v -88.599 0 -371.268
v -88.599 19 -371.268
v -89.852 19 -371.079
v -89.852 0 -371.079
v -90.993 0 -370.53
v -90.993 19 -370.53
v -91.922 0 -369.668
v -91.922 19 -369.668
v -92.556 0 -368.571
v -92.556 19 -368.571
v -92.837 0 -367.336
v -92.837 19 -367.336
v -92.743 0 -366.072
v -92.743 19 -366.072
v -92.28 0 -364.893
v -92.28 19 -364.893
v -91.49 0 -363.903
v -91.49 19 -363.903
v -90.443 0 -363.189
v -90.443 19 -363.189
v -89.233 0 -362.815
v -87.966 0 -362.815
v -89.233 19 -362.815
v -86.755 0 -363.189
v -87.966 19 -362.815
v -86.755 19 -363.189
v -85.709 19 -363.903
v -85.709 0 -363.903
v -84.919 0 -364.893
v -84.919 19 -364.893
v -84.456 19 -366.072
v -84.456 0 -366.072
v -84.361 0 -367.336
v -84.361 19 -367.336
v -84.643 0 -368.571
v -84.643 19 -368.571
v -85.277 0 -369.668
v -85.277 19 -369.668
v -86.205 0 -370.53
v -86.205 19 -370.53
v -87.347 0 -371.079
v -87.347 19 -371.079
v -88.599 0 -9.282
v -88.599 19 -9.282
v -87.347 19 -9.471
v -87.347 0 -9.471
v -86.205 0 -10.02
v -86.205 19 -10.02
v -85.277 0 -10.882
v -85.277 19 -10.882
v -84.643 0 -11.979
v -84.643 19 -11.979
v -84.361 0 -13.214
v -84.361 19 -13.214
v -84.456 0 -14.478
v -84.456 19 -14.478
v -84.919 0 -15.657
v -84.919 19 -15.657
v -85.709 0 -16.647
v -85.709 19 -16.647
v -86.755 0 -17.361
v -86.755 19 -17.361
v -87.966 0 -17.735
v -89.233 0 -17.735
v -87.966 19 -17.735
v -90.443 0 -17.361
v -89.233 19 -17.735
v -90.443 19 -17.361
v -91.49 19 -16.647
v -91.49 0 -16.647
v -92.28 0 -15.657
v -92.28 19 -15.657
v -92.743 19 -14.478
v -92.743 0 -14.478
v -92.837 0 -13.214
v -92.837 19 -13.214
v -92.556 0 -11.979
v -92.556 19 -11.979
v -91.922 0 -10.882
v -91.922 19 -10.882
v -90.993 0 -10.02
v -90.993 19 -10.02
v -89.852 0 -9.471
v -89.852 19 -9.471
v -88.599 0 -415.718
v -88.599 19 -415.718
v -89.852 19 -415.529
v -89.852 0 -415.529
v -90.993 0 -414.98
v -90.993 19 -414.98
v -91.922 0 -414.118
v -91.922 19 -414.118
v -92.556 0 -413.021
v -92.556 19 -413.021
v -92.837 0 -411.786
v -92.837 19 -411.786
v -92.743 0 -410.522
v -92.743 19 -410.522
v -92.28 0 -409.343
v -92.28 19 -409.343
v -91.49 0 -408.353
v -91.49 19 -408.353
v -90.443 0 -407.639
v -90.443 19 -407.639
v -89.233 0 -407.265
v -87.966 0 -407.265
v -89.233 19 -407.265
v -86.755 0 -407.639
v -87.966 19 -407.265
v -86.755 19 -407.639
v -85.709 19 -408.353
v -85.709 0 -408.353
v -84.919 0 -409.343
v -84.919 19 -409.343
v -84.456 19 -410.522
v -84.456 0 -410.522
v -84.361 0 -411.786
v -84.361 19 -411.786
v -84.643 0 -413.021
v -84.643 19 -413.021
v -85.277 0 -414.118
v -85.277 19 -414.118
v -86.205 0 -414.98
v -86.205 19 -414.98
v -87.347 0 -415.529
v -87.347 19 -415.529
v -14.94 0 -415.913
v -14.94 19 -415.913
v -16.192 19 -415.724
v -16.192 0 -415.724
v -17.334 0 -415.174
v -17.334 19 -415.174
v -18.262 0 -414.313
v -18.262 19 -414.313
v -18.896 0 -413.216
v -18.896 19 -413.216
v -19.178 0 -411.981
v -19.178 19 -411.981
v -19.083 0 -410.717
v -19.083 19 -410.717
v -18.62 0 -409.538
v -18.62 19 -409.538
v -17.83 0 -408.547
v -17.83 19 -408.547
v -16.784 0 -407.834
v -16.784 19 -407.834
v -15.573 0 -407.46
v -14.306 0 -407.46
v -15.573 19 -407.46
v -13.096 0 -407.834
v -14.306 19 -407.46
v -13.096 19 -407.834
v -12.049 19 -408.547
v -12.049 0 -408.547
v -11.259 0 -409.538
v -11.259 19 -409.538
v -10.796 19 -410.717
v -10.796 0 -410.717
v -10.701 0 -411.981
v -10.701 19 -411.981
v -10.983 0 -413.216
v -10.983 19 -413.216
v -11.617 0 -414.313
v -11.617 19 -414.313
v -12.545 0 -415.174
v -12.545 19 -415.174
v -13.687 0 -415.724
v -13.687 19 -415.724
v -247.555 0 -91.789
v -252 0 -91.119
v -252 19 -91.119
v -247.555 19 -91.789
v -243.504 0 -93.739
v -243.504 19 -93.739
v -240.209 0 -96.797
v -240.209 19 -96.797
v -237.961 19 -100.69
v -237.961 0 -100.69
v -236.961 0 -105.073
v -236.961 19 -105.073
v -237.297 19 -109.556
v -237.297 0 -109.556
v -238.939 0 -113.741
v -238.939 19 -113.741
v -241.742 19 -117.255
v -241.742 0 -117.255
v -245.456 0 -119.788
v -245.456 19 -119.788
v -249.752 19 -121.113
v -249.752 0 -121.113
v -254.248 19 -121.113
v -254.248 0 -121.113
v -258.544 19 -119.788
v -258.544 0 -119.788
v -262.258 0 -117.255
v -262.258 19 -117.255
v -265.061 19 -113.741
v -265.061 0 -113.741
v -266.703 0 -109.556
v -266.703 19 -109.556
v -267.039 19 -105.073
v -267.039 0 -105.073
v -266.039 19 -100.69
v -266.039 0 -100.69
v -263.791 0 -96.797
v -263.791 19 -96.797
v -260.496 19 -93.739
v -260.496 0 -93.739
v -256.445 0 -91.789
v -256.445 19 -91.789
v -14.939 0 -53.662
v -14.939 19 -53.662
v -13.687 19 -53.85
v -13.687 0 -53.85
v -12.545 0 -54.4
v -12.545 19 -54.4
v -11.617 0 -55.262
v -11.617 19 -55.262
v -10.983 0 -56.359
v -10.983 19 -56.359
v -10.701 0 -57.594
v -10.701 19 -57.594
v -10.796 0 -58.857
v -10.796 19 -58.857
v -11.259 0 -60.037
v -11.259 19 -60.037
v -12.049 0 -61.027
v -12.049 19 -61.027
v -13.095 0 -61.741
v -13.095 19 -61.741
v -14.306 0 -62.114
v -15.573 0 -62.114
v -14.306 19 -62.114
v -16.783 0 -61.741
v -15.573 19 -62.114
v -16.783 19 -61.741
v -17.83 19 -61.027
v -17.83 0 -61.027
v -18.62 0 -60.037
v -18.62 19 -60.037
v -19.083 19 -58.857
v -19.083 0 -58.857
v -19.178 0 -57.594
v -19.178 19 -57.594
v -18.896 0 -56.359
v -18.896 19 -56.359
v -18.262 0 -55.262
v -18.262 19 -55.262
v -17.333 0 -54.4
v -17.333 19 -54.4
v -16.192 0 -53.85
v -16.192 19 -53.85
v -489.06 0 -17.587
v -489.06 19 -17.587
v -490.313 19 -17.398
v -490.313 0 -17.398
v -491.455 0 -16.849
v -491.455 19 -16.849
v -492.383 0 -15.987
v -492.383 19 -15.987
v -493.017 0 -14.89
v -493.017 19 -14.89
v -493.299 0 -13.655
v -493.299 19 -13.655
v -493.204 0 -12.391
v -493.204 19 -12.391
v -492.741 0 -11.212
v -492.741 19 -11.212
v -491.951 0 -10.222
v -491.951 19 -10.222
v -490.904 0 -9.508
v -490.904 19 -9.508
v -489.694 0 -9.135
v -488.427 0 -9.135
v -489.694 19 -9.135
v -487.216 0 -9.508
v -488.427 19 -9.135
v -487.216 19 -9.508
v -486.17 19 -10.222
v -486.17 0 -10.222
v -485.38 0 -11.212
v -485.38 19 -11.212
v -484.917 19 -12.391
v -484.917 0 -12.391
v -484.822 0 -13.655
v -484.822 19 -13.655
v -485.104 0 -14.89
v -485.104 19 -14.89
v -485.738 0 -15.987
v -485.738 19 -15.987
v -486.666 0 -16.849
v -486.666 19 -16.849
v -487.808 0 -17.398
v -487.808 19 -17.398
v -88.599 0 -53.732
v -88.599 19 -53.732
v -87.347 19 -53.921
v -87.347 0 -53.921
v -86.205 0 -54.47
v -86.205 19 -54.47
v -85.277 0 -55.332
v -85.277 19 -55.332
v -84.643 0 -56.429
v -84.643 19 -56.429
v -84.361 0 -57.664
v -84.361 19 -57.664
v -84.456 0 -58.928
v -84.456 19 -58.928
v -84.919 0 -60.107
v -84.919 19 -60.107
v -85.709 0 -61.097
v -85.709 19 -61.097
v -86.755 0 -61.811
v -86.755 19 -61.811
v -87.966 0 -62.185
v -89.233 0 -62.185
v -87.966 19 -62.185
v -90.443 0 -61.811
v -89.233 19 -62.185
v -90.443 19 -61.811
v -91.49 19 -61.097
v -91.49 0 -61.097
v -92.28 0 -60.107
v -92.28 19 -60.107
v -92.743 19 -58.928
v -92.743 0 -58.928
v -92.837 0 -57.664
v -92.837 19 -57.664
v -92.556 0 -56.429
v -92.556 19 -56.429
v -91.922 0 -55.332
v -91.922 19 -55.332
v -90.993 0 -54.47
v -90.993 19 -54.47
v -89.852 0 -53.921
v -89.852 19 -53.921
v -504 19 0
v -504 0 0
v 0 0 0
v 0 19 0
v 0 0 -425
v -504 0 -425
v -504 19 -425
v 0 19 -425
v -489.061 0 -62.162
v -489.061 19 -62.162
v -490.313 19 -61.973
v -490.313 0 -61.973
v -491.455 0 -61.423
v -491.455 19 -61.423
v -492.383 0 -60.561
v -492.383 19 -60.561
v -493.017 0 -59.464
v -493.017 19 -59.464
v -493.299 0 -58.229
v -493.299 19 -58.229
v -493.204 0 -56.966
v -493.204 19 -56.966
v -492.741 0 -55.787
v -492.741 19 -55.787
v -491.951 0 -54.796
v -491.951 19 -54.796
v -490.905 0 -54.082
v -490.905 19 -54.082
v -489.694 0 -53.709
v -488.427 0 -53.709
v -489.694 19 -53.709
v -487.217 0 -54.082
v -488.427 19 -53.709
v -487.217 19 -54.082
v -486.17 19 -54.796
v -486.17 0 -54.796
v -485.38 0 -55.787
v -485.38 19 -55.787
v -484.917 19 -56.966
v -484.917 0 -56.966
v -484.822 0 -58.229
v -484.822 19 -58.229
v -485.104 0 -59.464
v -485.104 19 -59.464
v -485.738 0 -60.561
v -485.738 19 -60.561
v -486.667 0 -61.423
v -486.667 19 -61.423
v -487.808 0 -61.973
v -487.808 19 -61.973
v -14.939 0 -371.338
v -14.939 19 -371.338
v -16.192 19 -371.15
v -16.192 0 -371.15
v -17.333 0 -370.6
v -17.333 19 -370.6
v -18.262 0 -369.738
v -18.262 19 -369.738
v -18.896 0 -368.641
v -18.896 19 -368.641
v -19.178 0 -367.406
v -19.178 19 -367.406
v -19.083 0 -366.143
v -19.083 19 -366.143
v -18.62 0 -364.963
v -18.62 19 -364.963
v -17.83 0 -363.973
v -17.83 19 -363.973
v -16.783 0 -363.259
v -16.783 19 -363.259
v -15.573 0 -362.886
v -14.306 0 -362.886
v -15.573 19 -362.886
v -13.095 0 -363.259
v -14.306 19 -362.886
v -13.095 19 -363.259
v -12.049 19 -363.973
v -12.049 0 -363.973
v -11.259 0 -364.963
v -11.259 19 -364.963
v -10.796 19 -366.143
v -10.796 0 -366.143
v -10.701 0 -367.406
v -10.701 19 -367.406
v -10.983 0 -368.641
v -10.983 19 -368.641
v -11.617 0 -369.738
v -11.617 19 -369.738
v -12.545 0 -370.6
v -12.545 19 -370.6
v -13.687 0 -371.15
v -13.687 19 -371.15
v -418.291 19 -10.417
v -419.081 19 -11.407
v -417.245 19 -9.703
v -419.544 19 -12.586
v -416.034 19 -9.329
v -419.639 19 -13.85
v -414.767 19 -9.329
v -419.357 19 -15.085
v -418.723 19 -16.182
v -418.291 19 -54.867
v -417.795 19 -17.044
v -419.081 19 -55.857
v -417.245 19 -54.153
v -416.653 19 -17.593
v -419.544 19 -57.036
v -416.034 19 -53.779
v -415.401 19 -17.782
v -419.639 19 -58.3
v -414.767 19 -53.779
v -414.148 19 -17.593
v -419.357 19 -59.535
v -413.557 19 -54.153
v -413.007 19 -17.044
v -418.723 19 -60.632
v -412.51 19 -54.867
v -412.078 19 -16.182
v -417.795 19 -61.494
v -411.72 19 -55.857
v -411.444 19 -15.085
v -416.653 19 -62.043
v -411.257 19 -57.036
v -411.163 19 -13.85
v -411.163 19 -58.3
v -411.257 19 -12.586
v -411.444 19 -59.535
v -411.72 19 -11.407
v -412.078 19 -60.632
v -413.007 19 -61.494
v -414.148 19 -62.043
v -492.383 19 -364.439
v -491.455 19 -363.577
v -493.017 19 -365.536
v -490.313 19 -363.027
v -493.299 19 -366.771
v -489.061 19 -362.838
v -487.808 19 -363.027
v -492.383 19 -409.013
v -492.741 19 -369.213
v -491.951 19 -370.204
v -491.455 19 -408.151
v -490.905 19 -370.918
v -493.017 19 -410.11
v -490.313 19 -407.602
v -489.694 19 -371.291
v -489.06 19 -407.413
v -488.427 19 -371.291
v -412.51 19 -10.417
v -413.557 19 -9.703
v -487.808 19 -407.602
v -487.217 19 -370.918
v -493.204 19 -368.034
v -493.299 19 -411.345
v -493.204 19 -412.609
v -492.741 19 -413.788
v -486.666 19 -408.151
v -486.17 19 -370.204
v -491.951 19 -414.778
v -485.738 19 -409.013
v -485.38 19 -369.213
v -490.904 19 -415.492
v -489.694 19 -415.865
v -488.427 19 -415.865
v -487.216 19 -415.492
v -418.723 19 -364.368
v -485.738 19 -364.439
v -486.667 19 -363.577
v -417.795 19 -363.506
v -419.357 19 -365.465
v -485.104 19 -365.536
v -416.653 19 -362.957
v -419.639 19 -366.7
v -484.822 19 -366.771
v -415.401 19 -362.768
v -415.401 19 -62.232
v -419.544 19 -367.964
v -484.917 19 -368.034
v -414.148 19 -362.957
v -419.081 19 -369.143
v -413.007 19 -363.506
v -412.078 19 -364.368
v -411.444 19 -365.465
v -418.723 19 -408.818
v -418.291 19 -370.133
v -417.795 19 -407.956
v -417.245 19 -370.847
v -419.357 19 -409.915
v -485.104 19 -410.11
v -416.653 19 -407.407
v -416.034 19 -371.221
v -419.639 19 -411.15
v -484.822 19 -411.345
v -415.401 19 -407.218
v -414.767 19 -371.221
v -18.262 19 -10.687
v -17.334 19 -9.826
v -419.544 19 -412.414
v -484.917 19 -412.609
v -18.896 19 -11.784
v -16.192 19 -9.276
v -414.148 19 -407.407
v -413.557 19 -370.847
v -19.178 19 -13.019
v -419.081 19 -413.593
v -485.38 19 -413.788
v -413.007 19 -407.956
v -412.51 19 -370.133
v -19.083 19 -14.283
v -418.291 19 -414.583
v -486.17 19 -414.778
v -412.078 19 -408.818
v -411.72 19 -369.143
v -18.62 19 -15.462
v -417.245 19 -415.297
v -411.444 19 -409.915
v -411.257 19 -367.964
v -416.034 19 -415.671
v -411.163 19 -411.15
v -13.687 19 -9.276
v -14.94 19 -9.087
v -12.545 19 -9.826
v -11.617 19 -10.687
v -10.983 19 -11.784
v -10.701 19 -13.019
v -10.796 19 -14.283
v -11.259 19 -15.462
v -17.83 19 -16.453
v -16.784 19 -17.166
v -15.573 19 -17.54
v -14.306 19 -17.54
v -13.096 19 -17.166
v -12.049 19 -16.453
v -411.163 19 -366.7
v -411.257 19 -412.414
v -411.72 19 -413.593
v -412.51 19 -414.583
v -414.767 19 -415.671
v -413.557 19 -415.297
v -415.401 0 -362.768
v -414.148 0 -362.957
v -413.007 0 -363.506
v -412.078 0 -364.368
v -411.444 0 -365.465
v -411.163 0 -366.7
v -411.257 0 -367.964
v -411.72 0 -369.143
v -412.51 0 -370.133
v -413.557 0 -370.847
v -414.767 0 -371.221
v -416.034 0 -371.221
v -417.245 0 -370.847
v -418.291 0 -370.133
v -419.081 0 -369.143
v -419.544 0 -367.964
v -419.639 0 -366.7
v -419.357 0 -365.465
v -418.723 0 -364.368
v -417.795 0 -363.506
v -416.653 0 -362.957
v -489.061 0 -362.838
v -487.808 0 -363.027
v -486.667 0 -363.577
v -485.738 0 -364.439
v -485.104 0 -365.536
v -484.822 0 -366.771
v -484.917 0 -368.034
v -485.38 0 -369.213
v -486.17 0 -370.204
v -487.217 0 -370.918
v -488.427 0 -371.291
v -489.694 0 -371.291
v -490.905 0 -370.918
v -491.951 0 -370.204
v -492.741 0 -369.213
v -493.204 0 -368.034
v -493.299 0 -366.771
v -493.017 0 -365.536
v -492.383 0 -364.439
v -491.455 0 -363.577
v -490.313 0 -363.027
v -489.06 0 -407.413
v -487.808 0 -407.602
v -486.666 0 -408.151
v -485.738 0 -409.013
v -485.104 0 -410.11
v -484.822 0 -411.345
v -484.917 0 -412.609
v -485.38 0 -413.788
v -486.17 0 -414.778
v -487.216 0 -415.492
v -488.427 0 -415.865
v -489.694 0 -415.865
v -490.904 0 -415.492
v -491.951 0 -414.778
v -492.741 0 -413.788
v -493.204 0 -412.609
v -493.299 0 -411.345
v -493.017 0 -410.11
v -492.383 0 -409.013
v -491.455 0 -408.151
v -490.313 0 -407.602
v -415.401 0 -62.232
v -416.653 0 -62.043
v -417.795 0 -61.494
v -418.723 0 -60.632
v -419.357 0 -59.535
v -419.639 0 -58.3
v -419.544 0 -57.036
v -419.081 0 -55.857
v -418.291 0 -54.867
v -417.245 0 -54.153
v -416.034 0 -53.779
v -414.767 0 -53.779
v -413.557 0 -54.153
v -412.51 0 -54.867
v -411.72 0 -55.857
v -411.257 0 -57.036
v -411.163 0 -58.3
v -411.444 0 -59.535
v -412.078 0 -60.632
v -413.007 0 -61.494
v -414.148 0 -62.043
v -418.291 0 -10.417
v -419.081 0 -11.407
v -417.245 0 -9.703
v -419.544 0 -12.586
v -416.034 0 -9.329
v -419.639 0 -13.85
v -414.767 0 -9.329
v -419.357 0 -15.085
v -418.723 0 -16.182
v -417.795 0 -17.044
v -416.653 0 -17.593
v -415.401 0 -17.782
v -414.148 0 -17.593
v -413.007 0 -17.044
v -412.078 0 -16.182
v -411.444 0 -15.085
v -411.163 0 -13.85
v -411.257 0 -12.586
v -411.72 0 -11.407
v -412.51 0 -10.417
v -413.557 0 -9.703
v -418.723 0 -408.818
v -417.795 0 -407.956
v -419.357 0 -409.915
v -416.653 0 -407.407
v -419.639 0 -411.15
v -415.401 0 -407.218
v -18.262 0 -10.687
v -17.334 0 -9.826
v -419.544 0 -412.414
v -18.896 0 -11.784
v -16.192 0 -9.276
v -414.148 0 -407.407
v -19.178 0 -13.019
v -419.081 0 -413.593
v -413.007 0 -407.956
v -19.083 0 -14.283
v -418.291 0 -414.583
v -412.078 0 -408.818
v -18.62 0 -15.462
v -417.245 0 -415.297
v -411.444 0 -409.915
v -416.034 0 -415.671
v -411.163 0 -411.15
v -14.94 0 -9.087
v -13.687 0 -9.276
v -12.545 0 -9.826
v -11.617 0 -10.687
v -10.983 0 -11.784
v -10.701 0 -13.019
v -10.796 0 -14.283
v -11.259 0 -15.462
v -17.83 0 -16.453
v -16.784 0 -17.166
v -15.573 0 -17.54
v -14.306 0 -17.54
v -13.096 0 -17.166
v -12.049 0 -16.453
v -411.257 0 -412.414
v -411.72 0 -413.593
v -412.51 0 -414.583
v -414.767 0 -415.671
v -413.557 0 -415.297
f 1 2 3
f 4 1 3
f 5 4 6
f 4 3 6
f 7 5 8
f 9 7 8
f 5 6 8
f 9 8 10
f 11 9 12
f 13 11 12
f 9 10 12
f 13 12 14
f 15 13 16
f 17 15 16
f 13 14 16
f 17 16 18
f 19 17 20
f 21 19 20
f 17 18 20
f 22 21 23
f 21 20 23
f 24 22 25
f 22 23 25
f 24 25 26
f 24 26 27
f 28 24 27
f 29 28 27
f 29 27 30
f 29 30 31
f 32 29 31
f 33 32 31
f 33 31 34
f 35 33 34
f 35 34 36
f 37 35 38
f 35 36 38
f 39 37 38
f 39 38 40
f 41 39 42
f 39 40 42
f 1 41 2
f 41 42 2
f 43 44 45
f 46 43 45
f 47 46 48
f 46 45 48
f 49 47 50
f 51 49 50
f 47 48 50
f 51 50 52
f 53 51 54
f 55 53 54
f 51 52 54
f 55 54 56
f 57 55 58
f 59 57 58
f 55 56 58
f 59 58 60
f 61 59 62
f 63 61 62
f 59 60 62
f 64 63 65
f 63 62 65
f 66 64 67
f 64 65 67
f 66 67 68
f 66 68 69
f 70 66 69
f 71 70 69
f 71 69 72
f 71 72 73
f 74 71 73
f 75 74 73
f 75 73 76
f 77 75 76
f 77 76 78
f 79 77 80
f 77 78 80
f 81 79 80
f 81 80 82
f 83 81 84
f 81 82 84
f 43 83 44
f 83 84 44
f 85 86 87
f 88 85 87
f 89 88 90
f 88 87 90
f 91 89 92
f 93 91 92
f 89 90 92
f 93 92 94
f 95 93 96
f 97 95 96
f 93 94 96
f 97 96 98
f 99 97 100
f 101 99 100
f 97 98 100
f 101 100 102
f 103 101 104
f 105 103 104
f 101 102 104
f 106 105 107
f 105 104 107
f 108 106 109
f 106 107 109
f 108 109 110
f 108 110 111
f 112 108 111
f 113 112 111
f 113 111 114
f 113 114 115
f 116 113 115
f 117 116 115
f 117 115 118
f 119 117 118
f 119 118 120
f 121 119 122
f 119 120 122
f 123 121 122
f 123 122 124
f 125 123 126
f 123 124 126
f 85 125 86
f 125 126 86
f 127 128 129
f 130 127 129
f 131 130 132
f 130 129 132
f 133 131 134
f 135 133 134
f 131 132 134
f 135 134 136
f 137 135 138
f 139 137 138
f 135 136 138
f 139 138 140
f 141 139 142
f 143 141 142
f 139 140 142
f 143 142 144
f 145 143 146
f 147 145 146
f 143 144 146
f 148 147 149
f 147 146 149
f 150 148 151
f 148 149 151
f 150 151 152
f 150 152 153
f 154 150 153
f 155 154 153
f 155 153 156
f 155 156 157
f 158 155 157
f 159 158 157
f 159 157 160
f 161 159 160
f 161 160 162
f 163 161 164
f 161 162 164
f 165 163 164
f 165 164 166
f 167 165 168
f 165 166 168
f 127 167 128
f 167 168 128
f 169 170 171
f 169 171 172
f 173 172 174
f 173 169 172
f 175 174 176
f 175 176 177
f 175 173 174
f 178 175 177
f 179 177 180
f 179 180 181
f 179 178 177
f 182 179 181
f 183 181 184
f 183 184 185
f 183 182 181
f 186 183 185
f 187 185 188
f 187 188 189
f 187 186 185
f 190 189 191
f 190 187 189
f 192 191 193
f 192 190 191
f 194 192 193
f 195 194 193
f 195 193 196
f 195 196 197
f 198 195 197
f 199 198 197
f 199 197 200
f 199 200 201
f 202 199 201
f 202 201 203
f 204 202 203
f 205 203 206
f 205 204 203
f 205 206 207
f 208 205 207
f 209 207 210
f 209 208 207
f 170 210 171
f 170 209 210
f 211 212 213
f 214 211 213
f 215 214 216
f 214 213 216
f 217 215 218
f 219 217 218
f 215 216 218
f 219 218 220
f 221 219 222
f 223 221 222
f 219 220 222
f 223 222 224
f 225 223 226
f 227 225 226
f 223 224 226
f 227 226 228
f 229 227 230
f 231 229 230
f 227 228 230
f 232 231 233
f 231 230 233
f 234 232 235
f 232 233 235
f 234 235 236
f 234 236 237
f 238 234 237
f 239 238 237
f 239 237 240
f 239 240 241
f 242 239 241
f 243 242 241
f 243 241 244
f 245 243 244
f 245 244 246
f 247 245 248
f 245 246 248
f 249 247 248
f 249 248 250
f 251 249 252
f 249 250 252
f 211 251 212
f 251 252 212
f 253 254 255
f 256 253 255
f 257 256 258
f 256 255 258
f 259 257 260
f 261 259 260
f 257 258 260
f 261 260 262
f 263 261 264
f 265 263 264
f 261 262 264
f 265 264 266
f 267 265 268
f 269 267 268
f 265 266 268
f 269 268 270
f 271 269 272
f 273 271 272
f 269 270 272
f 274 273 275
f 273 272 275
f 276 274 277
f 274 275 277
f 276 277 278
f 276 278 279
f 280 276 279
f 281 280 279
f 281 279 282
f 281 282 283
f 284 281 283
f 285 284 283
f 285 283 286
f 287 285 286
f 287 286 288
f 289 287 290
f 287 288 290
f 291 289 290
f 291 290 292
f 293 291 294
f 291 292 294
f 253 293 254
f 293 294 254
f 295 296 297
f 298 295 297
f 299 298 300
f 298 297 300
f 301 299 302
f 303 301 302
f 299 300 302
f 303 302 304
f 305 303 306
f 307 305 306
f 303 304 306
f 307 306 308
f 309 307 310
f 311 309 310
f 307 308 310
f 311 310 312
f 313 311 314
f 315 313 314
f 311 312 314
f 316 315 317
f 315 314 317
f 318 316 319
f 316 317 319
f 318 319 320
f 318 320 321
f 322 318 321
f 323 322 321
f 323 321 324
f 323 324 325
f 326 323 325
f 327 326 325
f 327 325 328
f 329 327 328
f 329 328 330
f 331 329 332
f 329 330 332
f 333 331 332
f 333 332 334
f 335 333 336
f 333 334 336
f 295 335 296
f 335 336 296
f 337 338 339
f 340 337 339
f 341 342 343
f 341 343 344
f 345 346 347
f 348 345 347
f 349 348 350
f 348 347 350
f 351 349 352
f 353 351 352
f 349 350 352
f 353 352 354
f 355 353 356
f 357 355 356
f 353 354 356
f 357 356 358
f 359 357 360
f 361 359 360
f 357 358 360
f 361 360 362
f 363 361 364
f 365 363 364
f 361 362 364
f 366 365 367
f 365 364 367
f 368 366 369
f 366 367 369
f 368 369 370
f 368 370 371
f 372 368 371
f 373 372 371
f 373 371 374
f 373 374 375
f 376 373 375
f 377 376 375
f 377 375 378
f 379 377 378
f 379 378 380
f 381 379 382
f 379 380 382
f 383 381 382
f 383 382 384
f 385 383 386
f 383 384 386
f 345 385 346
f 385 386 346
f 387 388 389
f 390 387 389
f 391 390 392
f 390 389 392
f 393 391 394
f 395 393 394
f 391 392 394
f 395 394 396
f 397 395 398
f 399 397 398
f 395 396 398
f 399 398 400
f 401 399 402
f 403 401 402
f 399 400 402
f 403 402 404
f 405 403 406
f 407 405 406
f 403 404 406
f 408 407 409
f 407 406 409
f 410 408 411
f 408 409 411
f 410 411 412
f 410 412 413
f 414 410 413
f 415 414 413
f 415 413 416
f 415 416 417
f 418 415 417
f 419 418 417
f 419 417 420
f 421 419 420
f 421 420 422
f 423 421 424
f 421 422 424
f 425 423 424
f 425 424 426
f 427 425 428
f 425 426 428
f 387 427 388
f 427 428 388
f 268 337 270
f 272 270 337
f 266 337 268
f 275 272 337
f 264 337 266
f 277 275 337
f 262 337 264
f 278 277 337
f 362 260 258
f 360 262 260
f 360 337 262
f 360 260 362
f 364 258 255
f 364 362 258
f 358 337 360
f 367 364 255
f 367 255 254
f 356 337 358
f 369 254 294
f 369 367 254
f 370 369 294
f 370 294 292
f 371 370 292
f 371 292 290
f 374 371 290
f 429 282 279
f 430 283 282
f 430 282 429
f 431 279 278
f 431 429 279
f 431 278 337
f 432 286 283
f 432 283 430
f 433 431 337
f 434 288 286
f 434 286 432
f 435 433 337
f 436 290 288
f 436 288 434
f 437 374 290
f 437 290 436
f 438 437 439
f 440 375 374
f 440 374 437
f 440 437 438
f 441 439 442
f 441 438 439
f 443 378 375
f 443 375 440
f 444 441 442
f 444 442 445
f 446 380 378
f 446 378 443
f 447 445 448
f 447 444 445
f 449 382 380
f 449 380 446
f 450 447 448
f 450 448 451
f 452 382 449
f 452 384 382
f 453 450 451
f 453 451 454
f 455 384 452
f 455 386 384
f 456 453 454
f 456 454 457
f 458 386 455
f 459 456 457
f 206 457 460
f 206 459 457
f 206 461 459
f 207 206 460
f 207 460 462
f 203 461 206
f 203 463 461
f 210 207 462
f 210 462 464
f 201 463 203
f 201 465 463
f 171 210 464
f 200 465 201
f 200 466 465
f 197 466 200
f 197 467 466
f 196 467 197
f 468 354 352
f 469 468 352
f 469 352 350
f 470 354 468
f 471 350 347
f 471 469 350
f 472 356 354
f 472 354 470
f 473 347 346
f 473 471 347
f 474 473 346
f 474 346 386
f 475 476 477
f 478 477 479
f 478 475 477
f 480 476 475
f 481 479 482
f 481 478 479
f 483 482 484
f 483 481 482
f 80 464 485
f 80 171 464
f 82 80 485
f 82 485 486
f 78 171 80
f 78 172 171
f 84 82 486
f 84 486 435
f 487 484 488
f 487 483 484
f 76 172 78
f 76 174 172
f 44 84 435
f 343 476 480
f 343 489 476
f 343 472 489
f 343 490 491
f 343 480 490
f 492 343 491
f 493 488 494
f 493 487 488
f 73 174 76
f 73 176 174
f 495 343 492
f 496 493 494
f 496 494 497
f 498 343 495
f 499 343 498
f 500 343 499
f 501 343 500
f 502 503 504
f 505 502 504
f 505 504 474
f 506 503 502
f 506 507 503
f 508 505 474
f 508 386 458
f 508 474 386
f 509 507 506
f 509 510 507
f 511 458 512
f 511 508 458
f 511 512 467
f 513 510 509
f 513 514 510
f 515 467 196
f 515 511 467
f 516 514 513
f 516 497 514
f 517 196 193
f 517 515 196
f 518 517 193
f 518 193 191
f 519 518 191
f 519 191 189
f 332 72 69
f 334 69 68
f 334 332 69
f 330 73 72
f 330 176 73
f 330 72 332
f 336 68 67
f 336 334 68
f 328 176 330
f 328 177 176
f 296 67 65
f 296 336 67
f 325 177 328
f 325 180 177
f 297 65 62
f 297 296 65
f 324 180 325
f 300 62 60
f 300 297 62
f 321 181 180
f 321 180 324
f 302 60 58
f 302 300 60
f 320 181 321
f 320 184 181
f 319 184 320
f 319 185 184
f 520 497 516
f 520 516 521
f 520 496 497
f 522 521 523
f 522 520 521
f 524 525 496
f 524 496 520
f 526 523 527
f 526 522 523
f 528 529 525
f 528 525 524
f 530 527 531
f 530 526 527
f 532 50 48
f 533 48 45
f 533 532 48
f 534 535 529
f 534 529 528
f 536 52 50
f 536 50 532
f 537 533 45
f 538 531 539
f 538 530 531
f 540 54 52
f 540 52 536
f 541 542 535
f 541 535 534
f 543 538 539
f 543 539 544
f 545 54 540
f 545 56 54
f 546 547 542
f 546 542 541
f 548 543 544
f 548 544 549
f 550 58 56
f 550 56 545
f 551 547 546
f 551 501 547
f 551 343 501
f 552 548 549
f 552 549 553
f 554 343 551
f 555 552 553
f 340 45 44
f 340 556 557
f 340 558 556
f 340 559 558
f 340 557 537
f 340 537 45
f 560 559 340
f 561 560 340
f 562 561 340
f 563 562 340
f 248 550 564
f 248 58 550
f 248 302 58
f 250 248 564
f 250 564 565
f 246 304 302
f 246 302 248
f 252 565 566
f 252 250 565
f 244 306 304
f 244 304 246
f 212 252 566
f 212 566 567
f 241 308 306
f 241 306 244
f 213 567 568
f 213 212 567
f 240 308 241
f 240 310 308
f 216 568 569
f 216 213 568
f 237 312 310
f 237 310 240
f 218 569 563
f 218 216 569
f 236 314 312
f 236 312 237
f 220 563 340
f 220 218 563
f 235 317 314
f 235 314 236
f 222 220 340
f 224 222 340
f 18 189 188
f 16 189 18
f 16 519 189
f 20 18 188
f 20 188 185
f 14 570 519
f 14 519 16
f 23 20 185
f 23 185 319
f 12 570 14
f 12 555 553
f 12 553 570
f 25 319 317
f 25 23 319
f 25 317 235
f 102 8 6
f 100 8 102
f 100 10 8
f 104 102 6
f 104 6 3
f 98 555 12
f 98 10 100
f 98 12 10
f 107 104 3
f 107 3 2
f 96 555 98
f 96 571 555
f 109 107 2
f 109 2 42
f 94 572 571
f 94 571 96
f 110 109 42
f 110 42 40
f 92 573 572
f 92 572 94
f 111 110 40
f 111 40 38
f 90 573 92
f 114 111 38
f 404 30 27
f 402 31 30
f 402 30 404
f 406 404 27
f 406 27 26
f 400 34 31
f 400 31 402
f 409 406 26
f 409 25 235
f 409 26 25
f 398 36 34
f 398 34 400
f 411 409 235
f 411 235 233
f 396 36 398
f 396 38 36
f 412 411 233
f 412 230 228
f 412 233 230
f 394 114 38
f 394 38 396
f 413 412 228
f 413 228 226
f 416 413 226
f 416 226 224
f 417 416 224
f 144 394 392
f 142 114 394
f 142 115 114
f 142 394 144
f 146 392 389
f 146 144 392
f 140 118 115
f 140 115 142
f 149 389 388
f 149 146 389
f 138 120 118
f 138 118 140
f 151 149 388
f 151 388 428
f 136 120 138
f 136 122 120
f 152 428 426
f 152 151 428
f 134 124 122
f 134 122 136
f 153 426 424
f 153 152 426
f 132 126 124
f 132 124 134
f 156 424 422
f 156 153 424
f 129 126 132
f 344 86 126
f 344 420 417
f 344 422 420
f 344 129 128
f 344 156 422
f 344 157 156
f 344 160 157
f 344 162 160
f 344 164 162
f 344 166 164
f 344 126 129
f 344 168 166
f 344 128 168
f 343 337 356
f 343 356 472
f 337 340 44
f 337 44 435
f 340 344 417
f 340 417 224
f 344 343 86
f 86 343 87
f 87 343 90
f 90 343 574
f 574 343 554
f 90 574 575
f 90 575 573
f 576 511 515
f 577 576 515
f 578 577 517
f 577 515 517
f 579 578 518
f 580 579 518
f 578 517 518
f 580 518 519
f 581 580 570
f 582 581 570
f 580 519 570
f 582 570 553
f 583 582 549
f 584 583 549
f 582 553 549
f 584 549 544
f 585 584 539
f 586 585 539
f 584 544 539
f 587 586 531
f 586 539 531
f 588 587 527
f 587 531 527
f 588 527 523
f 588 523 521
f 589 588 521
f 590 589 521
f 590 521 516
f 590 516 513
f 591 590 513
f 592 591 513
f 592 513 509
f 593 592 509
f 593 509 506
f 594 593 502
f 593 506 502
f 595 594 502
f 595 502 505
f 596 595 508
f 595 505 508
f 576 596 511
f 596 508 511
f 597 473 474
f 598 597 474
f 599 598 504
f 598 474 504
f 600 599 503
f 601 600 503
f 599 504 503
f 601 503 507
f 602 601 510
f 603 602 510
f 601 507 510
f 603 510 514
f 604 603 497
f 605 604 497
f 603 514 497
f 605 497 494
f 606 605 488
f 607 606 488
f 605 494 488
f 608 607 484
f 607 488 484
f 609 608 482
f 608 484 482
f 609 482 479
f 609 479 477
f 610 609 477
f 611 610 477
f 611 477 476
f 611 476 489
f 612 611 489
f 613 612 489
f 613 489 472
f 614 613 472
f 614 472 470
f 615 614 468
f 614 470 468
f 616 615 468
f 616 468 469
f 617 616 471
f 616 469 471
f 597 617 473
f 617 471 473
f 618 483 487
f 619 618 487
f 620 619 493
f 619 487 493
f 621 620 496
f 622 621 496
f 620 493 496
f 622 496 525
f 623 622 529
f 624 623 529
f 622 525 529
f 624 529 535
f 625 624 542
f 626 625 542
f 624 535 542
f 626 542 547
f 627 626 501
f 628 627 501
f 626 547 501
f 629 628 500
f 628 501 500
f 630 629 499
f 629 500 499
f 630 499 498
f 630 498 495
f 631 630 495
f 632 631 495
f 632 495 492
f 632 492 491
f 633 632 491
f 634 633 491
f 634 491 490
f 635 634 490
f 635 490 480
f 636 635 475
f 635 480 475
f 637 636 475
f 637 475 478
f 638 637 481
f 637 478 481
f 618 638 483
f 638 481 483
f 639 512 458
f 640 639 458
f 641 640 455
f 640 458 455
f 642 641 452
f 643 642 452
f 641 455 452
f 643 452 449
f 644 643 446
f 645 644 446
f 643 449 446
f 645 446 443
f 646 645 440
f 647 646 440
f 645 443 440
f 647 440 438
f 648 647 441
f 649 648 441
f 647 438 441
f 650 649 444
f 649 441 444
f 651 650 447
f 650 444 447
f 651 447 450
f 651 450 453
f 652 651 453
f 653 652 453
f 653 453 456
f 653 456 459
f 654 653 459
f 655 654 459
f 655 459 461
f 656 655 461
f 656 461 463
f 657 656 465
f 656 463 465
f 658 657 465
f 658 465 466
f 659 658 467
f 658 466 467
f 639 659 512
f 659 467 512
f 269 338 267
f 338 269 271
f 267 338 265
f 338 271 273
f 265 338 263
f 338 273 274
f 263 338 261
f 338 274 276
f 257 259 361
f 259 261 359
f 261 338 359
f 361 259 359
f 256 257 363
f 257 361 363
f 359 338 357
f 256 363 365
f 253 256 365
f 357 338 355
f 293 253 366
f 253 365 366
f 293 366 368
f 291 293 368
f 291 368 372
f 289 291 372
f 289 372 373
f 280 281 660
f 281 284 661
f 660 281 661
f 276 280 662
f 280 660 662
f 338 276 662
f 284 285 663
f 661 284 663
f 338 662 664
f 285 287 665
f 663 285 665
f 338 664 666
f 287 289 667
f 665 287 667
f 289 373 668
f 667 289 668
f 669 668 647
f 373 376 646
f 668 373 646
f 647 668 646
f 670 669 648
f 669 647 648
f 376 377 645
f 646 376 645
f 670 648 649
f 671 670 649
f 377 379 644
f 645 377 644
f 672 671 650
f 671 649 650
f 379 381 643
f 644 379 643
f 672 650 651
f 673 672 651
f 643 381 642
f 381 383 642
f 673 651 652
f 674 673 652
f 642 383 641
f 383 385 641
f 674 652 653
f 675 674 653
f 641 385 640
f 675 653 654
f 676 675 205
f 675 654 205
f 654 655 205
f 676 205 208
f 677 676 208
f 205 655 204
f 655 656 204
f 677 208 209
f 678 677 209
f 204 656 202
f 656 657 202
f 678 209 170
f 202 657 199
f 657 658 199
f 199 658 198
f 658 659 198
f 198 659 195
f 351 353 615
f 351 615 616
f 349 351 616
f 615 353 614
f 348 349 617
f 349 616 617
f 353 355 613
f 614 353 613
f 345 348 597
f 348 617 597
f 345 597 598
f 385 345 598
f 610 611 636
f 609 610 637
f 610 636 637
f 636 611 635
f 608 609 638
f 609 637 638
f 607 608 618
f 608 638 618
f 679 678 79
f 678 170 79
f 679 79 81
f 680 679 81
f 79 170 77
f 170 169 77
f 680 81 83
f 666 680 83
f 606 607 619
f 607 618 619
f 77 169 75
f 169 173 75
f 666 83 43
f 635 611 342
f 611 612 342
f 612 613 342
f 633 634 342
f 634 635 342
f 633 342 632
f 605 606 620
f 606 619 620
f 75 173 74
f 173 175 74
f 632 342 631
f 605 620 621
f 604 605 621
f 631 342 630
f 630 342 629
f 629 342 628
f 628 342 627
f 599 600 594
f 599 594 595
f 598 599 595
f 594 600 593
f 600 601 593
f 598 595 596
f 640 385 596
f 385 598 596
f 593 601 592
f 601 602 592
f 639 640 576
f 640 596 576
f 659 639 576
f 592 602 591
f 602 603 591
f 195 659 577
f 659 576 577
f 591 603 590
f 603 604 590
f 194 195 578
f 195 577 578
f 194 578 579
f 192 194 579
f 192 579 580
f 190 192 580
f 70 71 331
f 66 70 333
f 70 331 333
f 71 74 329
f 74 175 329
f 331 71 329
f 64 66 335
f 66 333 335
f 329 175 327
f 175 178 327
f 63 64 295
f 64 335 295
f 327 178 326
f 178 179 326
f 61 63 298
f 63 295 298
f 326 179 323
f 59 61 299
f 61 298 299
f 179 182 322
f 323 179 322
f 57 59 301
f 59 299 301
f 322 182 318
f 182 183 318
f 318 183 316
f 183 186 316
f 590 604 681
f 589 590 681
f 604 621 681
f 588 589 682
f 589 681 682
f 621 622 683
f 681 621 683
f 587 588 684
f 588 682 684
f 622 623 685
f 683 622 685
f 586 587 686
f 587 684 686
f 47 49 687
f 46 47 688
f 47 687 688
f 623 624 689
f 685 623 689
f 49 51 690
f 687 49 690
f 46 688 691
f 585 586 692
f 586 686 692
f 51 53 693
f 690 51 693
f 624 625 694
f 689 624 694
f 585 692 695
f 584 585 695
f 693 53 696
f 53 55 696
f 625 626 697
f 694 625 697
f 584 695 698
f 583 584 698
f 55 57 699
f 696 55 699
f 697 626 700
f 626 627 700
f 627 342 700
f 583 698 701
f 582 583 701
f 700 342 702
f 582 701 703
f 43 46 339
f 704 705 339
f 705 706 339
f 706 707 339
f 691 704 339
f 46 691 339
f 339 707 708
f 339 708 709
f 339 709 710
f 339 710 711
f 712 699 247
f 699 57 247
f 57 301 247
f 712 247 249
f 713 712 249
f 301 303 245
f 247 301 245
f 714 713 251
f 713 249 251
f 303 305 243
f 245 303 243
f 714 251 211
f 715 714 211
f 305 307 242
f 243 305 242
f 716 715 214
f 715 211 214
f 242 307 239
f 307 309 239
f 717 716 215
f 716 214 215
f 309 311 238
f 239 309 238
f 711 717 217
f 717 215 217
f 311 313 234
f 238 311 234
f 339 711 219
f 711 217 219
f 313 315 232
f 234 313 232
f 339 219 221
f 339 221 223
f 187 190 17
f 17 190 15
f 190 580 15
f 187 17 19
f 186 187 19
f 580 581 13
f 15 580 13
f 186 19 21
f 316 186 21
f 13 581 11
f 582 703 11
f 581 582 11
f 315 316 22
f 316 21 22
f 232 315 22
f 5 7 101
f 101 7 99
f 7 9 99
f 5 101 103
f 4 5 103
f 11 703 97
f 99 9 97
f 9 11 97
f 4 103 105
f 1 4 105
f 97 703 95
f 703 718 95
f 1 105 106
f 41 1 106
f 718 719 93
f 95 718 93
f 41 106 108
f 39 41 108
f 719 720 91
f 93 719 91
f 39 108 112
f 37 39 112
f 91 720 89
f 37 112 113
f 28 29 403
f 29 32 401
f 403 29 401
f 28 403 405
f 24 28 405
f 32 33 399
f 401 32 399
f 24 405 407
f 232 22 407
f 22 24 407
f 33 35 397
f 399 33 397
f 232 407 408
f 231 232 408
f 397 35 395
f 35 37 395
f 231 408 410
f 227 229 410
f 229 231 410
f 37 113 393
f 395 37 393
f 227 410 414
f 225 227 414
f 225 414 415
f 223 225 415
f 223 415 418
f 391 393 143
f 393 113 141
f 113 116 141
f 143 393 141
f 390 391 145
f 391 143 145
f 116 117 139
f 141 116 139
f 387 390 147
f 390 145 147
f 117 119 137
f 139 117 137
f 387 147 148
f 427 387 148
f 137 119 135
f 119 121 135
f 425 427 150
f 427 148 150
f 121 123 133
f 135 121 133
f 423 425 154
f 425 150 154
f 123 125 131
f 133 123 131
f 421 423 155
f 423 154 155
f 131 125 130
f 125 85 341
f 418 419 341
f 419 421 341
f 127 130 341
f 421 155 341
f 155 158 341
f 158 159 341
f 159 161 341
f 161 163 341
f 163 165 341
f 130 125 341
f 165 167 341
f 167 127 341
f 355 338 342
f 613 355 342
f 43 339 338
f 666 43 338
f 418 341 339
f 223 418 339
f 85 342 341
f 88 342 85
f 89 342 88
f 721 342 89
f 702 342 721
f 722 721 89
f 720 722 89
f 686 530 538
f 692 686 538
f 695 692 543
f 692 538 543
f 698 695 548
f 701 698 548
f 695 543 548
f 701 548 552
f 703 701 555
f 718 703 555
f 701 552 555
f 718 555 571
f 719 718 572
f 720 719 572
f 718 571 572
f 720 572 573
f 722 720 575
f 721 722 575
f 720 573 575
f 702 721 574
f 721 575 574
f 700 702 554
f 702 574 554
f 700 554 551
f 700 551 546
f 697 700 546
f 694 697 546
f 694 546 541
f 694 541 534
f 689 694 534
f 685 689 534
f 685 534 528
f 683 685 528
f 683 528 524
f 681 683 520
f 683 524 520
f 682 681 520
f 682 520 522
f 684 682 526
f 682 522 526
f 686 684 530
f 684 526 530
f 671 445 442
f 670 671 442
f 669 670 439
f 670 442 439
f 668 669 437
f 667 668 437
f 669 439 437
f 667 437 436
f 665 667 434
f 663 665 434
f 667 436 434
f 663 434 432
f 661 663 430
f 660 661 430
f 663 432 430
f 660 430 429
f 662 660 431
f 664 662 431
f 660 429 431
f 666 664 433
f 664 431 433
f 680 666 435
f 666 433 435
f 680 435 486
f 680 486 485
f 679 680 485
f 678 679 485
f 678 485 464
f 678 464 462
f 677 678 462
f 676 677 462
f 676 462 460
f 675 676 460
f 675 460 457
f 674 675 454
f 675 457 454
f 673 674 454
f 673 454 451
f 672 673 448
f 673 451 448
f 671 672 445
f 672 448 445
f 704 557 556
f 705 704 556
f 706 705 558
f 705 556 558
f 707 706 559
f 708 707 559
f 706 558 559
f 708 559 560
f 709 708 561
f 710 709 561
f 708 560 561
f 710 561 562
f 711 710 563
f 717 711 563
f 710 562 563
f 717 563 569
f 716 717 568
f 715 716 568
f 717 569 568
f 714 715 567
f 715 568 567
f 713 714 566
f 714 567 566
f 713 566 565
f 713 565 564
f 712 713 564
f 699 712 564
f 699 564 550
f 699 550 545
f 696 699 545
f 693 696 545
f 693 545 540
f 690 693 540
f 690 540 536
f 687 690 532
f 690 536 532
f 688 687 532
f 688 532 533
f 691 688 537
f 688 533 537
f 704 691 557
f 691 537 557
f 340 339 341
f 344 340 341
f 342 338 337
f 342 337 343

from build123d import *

# Parameters (mm, degrees)
SKETCH1_W           = 504
SKETCH1_H           = 425
SKETCH1_R           = 15.08125
BOSS_EXTRUDE1_DEPTH = 19
SKETCH2_R           = 4.25
CUT_EXTRUDE3_DEPTH  = 19


with BuildPart() as part:
    # Sketch1 → Boss-Extrude1 (new body)
    with BuildSketch(Plane(origin=(0, 0, 0), x_dir=(1, 0, 0), z_dir=(0, 1, 0))):
        with Locations((-252, 212.5)):
            Rectangle(SKETCH1_W, SKETCH1_H)
        with Locations(Location((-252, 106.2, 0), (0, 0, 270))):  # turned: the seam where the file's is
            Circle(SKETCH1_R, mode=Mode.SUBTRACT)
    extrude(amount=BOSS_EXTRUDE1_DEPTH)

    # Sketch2 → Cut-Extrude3 (cut)
    with BuildSketch(Plane(origin=(0, 19, 0), x_dir=(1, 0, 0), z_dir=(0, 1, 0))):
        with Locations(Location((-88.599351486, 57.982002922, 0), (0, 0, 270))):  # turned: the seam where the file's is
            Circle(SKETCH2_R)
        with Locations(Location((-14.939385216, 57.911511452, 0), (0, 0, 270))):  # turned: the seam where the file's is
            Circle(SKETCH2_R)
        with Locations(Location((-88.599351486, 13.532002922, 0), (0, 0, 270))):  # turned: the seam where the file's is
            Circle(SKETCH2_R)
        with Locations(Location((-14.939609501, 13.337039706, 0), (0, 0, 270))):  # turned: the seam where the file's is
            Circle(SKETCH2_R)
        with Locations(Location((-14.939609501, 411.662960294, 0), (0, 0, 90))):  # turned: the seam where the file's is
            Circle(SKETCH2_R)
        with Locations(Location((-88.599351486, 411.467997078, 0), (0, 0, 90))):  # turned: the seam where the file's is
            Circle(SKETCH2_R)
        with Locations(Location((-14.939385216, 367.088488548, 0), (0, 0, 90))):  # turned: the seam where the file's is
            Circle(SKETCH2_R)
        with Locations(Location((-88.599351486, 367.017997078, 0), (0, 0, 90))):  # turned: the seam where the file's is
            Circle(SKETCH2_R)
        with Locations(Location((-415.400648514, 367.017997078, 0), (0, 0, 270))):  # turned: the seam where the file's is
            Circle(SKETCH2_R)
        with Locations(Location((-489.060614784, 367.088488548, 0), (0, 0, 270))):  # turned: the seam where the file's is
            Circle(SKETCH2_R)
        with Locations(Location((-415.400648514, 411.467997078, 0), (0, 0, 270))):  # turned: the seam where the file's is
            Circle(SKETCH2_R)
        with Locations(Location((-489.060390499, 411.662960294, 0), (0, 0, 270))):  # turned: the seam where the file's is
            Circle(SKETCH2_R)
        with Locations(Location((-489.060390499, 13.337039706, 0), (0, 0, 90))):  # turned: the seam where the file's is
            Circle(SKETCH2_R)
        with Locations(Location((-415.400648514, 13.532002922, 0), (0, 0, 90))):  # turned: the seam where the file's is
            Circle(SKETCH2_R)
        with Locations(Location((-489.060614784, 57.911511452, 0), (0, 0, 90))):  # turned: the seam where the file's is
            Circle(SKETCH2_R)
        with Locations(Location((-415.400648514, 57.982002922, 0), (0, 0, 90))):  # turned: the seam where the file's is
            Circle(SKETCH2_R)
    extrude(amount=-CUT_EXTRUDE3_DEPTH, mode=Mode.SUBTRACT)


solid = part.part
